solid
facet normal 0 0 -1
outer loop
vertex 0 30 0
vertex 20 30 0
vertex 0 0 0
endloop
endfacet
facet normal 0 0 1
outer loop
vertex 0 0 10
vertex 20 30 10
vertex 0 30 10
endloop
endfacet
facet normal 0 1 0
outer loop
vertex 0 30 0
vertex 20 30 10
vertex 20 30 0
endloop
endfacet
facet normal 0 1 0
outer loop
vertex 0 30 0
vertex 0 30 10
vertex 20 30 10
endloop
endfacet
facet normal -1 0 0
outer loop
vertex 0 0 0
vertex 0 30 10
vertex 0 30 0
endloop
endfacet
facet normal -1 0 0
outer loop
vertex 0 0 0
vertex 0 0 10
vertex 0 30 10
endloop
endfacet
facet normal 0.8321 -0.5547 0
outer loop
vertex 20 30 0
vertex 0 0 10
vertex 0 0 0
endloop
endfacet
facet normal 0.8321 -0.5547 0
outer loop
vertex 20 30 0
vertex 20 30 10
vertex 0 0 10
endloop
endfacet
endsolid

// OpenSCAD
include <MCAD/constants.scad>;

function inches(n) = n*mm_per_inch;

module right_triangle(width, height, thickness) {
    linear_extrude(height=thickness, center = false)
        polygon([[0, 0], [0, height], [width, height]]);
}

// testing
right_triangle(20, 30, 10);
